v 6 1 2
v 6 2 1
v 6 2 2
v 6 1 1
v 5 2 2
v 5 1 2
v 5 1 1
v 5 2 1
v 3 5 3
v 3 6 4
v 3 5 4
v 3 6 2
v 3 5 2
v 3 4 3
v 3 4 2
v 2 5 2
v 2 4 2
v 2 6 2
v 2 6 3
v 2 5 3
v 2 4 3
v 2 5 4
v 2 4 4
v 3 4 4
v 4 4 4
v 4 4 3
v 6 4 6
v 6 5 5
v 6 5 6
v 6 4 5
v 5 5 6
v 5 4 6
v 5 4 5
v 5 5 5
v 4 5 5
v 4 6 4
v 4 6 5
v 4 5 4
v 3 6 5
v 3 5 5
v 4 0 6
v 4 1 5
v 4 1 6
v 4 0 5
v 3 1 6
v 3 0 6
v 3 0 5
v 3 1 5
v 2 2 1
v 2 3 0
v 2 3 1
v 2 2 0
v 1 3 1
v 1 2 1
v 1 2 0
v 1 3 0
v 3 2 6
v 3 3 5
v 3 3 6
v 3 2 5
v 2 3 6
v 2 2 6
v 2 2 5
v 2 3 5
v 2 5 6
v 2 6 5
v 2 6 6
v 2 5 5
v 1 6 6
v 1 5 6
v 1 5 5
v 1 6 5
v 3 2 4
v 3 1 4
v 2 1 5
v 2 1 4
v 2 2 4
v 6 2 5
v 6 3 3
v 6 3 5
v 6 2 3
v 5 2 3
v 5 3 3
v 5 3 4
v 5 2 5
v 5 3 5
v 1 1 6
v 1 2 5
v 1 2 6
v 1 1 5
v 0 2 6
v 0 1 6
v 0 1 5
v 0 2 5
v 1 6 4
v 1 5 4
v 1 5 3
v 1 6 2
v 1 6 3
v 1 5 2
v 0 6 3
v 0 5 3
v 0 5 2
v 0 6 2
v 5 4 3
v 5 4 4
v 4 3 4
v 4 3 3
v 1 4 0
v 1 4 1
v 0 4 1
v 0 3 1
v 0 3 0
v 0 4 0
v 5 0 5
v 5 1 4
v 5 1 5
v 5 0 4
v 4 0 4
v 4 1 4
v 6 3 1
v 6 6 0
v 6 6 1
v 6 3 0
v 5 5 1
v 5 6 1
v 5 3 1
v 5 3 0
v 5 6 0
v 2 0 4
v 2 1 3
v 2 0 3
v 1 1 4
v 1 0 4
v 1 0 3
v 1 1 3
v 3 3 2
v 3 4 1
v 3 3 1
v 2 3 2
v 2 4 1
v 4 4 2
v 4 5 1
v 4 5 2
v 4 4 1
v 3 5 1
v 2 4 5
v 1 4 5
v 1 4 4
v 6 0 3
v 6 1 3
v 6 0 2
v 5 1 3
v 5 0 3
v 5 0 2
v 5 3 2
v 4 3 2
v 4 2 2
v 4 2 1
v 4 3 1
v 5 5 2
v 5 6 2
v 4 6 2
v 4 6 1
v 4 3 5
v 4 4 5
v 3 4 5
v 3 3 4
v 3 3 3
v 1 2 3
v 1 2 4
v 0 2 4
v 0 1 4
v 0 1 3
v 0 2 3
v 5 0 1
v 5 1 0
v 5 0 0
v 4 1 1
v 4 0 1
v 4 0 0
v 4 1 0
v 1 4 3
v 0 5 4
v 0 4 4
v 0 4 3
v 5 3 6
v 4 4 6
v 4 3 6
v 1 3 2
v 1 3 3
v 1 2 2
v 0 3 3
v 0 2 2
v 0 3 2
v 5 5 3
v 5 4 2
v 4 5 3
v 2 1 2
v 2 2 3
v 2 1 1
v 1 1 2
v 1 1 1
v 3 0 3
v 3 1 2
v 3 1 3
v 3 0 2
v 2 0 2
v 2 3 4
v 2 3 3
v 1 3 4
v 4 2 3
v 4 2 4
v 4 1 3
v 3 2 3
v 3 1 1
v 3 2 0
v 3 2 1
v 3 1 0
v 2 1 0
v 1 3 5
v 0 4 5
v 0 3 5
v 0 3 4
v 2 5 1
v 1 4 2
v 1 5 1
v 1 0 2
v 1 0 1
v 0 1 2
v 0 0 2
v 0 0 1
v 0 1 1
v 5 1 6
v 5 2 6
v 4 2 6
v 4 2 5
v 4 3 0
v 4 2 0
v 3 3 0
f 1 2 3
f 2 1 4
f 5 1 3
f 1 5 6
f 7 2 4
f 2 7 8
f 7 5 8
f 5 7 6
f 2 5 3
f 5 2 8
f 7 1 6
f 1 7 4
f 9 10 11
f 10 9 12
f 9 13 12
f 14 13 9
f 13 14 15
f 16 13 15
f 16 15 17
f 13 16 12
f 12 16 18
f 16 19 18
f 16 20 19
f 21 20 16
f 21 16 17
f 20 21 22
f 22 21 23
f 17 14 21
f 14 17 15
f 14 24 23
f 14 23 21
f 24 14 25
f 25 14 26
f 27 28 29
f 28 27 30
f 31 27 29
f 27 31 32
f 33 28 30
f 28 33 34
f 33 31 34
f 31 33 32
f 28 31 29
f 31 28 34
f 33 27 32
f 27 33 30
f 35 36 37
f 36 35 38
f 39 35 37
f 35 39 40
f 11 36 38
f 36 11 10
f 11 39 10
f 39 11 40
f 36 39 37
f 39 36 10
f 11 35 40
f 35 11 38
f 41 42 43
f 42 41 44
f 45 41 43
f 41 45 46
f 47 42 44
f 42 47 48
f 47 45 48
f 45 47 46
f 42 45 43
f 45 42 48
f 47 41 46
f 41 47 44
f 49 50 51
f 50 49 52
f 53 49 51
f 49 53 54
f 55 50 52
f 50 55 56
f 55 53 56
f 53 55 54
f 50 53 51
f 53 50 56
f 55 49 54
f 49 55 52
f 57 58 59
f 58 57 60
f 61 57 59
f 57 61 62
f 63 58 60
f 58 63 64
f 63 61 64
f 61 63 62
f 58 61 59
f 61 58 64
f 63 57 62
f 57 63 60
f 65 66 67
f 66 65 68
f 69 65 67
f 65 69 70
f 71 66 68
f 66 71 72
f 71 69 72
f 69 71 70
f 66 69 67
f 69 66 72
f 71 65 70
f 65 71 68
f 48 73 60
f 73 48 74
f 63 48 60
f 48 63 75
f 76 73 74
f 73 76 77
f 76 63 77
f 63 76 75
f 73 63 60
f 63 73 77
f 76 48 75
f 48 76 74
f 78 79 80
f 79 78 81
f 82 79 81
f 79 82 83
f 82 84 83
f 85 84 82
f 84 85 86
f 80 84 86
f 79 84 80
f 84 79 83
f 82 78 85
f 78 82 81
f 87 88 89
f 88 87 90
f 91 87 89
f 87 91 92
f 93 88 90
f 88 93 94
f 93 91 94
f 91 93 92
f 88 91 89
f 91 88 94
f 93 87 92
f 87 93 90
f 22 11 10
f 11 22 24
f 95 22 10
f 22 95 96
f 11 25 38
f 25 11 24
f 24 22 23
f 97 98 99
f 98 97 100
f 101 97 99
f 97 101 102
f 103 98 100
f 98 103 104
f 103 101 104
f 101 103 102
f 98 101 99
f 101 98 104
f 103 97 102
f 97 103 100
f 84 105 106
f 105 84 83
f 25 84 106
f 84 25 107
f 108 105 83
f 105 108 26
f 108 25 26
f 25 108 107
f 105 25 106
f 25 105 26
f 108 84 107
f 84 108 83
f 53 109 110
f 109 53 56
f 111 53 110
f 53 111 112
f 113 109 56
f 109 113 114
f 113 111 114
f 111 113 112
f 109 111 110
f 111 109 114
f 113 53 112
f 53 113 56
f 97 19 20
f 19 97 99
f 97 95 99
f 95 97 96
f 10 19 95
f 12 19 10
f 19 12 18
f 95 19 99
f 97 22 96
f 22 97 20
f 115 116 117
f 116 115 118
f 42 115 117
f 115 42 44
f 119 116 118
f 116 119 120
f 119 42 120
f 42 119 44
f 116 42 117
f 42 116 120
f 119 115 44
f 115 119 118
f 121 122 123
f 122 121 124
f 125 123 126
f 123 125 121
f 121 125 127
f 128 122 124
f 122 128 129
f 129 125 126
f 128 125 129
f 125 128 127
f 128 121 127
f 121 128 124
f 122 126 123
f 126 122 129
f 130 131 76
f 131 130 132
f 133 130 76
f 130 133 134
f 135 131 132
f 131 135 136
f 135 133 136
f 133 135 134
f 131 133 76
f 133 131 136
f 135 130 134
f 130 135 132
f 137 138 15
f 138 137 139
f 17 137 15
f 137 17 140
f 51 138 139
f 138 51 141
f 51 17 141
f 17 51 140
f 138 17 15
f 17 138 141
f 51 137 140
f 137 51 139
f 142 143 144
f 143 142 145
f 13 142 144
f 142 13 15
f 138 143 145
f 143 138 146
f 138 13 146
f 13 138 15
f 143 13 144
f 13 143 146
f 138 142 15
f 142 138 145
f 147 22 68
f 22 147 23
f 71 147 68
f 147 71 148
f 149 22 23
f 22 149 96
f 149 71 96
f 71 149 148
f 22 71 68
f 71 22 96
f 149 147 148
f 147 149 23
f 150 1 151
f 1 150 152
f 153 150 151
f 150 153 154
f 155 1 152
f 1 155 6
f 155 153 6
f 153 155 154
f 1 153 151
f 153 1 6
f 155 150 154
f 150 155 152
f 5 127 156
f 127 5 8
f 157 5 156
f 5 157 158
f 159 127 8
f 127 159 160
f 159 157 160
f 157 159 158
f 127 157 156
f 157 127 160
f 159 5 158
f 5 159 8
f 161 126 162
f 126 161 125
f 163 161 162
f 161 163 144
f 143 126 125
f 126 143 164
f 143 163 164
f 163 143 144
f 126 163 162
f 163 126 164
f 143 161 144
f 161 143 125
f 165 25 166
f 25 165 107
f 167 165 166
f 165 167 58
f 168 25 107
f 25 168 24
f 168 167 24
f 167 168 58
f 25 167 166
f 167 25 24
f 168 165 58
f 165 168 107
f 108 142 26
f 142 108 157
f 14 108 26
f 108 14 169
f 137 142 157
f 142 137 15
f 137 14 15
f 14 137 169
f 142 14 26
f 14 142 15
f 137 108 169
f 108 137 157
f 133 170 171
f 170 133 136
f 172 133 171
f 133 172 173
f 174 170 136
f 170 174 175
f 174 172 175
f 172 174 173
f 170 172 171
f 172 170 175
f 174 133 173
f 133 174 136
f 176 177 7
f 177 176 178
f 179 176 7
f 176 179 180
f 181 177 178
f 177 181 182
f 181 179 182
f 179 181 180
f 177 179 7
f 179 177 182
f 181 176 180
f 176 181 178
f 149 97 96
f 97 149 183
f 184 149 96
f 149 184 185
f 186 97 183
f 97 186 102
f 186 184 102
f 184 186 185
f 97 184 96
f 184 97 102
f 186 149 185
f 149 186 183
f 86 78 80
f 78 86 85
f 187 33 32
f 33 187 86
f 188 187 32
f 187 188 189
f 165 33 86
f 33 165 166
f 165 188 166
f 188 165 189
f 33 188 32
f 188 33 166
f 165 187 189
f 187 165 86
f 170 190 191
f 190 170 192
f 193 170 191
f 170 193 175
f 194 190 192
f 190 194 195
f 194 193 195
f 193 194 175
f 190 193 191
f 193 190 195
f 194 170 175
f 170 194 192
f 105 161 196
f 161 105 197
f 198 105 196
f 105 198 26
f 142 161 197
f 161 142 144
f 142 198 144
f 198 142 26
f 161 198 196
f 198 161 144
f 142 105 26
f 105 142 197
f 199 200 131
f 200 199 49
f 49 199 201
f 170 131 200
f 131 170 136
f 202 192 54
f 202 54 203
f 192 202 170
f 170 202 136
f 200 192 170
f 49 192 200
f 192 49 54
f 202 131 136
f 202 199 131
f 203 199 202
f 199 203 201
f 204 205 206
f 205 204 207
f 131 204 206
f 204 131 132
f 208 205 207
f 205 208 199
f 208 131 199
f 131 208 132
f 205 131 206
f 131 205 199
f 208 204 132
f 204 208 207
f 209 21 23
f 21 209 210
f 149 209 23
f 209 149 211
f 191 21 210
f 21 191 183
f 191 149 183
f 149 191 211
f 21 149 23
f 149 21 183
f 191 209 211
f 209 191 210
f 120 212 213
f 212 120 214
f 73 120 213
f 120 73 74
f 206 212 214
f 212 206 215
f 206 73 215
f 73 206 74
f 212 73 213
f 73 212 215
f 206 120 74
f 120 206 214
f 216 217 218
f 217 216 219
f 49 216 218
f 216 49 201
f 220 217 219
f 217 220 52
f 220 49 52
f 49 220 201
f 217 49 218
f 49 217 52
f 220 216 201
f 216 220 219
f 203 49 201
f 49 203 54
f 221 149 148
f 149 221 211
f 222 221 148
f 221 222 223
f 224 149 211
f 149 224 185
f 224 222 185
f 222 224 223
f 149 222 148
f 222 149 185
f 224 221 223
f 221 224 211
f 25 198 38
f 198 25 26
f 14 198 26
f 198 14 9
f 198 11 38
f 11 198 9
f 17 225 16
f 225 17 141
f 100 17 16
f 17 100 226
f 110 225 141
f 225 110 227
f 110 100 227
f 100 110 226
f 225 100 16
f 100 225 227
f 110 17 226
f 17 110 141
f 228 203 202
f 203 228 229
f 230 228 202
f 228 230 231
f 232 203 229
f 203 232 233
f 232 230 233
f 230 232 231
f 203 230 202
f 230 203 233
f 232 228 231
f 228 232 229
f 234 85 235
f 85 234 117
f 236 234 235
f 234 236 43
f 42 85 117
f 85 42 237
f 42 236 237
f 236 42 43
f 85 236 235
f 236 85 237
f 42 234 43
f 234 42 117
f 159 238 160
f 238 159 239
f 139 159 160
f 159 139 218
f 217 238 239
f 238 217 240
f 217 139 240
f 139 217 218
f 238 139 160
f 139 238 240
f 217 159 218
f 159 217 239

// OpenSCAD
union() {
    translate([5.0, 1.0, 1.0]) cube([1, 1, 1]);
    translate([2.0, 4.0, 2.0]) cube([1, 1, 1]);
    translate([5.0, 4.0, 5.0]) cube([1, 1, 1]);
    translate([3.0, 5.0, 4.0]) cube([1, 1, 1]);
    translate([3.0, 0.0, 5.0]) cube([1, 1, 1]);
    translate([1.0, 2.0, 0.0]) cube([1, 1, 1]);
    translate([2.0, 2.0, 5.0]) cube([1, 1, 1]);
    translate([1.0, 5.0, 5.0]) cube([1, 1, 1]);
    translate([2.0, 1.0, 4.0]) cube([1, 1, 1]);
    translate([5.0, 2.0, 3.0]) cube([1, 1, 1]);
    translate([0.0, 1.0, 5.0]) cube([1, 1, 1]);
    translate([2.0, 4.0, 3.0]) cube([1, 1, 1]);
    translate([0.0, 5.0, 2.0]) cube([1, 1, 1]);
    translate([4.0, 3.0, 3.0]) cube([1, 1, 1]);
    translate([0.0, 3.0, 0.0]) cube([1, 1, 1]);
    translate([1.0, 5.0, 3.0]) cube([1, 1, 1]);
    translate([4.0, 0.0, 4.0]) cube([1, 1, 1]);
    translate([2.0, 5.0, 2.0]) cube([1, 1, 1]);
    translate([5.0, 3.0, 0.0]) cube([1, 1, 1]);
    translate([5.0, 5.0, 0.0]) cube([1, 1, 1]);
    translate([1.0, 0.0, 3.0]) cube([1, 1, 1]);
    translate([2.0, 3.0, 1.0]) cube([1, 1, 1]);
    translate([3.0, 4.0, 1.0]) cube([1, 1, 1]);
    translate([1.0, 4.0, 4.0]) cube([1, 1, 1]);
    translate([5.0, 0.0, 2.0]) cube([1, 1, 1]);
    translate([4.0, 2.0, 1.0]) cube([1, 1, 1]);
    translate([4.0, 5.0, 1.0]) cube([1, 1, 1]);
    translate([3.0, 3.0, 4.0]) cube([1, 1, 1]);
    translate([3.0, 3.0, 2.0]) cube([1, 1, 1]);
    translate([0.0, 1.0, 3.0]) cube([1, 1, 1]);
    translate([4.0, 0.0, 0.0]) cube([1, 1, 1]);
    translate([0.0, 4.0, 3.0]) cube([1, 1, 1]);
    translate([5.0, 2.0, 4.0]) cube([1, 1, 1]);
    translate([4.0, 3.0, 5.0]) cube([1, 1, 1]);
    translate([0.0, 2.0, 2.0]) cube([1, 1, 1]);
    translate([4.0, 4.0, 2.0]) cube([1, 1, 1]);
    translate([1.0, 1.0, 2.0]) cube([1, 1, 1]);
    translate([2.0, 0.0, 2.0]) cube([1, 1, 1]);
    translate([1.0, 3.0, 3.0]) cube([1, 1, 1]);
    translate([3.0, 1.0, 3.0]) cube([1, 1, 1]);
    translate([2.0, 1.0, 0.0]) cube([1, 1, 1]);
    translate([1.0, 1.0, 1.0]) cube([1, 1, 1]);
    translate([0.0, 3.0, 4.0]) cube([1, 1, 1]);
    translate([3.0, 4.0, 3.0]) cube([1, 1, 1]);
    translate([1.0, 4.0, 1.0]) cube([1, 1, 1]);
    translate([0.0, 0.0, 1.0]) cube([1, 1, 1]);
    translate([5.0, 4.0, 0.0]) cube([1, 1, 1]);
    translate([4.0, 1.0, 5.0]) cube([1, 1, 1]);
    translate([2.0, 5.0, 3.0]) cube([1, 1, 1]);
    translate([3.0, 2.0, 0.0]) cube([1, 1, 1]);
}
